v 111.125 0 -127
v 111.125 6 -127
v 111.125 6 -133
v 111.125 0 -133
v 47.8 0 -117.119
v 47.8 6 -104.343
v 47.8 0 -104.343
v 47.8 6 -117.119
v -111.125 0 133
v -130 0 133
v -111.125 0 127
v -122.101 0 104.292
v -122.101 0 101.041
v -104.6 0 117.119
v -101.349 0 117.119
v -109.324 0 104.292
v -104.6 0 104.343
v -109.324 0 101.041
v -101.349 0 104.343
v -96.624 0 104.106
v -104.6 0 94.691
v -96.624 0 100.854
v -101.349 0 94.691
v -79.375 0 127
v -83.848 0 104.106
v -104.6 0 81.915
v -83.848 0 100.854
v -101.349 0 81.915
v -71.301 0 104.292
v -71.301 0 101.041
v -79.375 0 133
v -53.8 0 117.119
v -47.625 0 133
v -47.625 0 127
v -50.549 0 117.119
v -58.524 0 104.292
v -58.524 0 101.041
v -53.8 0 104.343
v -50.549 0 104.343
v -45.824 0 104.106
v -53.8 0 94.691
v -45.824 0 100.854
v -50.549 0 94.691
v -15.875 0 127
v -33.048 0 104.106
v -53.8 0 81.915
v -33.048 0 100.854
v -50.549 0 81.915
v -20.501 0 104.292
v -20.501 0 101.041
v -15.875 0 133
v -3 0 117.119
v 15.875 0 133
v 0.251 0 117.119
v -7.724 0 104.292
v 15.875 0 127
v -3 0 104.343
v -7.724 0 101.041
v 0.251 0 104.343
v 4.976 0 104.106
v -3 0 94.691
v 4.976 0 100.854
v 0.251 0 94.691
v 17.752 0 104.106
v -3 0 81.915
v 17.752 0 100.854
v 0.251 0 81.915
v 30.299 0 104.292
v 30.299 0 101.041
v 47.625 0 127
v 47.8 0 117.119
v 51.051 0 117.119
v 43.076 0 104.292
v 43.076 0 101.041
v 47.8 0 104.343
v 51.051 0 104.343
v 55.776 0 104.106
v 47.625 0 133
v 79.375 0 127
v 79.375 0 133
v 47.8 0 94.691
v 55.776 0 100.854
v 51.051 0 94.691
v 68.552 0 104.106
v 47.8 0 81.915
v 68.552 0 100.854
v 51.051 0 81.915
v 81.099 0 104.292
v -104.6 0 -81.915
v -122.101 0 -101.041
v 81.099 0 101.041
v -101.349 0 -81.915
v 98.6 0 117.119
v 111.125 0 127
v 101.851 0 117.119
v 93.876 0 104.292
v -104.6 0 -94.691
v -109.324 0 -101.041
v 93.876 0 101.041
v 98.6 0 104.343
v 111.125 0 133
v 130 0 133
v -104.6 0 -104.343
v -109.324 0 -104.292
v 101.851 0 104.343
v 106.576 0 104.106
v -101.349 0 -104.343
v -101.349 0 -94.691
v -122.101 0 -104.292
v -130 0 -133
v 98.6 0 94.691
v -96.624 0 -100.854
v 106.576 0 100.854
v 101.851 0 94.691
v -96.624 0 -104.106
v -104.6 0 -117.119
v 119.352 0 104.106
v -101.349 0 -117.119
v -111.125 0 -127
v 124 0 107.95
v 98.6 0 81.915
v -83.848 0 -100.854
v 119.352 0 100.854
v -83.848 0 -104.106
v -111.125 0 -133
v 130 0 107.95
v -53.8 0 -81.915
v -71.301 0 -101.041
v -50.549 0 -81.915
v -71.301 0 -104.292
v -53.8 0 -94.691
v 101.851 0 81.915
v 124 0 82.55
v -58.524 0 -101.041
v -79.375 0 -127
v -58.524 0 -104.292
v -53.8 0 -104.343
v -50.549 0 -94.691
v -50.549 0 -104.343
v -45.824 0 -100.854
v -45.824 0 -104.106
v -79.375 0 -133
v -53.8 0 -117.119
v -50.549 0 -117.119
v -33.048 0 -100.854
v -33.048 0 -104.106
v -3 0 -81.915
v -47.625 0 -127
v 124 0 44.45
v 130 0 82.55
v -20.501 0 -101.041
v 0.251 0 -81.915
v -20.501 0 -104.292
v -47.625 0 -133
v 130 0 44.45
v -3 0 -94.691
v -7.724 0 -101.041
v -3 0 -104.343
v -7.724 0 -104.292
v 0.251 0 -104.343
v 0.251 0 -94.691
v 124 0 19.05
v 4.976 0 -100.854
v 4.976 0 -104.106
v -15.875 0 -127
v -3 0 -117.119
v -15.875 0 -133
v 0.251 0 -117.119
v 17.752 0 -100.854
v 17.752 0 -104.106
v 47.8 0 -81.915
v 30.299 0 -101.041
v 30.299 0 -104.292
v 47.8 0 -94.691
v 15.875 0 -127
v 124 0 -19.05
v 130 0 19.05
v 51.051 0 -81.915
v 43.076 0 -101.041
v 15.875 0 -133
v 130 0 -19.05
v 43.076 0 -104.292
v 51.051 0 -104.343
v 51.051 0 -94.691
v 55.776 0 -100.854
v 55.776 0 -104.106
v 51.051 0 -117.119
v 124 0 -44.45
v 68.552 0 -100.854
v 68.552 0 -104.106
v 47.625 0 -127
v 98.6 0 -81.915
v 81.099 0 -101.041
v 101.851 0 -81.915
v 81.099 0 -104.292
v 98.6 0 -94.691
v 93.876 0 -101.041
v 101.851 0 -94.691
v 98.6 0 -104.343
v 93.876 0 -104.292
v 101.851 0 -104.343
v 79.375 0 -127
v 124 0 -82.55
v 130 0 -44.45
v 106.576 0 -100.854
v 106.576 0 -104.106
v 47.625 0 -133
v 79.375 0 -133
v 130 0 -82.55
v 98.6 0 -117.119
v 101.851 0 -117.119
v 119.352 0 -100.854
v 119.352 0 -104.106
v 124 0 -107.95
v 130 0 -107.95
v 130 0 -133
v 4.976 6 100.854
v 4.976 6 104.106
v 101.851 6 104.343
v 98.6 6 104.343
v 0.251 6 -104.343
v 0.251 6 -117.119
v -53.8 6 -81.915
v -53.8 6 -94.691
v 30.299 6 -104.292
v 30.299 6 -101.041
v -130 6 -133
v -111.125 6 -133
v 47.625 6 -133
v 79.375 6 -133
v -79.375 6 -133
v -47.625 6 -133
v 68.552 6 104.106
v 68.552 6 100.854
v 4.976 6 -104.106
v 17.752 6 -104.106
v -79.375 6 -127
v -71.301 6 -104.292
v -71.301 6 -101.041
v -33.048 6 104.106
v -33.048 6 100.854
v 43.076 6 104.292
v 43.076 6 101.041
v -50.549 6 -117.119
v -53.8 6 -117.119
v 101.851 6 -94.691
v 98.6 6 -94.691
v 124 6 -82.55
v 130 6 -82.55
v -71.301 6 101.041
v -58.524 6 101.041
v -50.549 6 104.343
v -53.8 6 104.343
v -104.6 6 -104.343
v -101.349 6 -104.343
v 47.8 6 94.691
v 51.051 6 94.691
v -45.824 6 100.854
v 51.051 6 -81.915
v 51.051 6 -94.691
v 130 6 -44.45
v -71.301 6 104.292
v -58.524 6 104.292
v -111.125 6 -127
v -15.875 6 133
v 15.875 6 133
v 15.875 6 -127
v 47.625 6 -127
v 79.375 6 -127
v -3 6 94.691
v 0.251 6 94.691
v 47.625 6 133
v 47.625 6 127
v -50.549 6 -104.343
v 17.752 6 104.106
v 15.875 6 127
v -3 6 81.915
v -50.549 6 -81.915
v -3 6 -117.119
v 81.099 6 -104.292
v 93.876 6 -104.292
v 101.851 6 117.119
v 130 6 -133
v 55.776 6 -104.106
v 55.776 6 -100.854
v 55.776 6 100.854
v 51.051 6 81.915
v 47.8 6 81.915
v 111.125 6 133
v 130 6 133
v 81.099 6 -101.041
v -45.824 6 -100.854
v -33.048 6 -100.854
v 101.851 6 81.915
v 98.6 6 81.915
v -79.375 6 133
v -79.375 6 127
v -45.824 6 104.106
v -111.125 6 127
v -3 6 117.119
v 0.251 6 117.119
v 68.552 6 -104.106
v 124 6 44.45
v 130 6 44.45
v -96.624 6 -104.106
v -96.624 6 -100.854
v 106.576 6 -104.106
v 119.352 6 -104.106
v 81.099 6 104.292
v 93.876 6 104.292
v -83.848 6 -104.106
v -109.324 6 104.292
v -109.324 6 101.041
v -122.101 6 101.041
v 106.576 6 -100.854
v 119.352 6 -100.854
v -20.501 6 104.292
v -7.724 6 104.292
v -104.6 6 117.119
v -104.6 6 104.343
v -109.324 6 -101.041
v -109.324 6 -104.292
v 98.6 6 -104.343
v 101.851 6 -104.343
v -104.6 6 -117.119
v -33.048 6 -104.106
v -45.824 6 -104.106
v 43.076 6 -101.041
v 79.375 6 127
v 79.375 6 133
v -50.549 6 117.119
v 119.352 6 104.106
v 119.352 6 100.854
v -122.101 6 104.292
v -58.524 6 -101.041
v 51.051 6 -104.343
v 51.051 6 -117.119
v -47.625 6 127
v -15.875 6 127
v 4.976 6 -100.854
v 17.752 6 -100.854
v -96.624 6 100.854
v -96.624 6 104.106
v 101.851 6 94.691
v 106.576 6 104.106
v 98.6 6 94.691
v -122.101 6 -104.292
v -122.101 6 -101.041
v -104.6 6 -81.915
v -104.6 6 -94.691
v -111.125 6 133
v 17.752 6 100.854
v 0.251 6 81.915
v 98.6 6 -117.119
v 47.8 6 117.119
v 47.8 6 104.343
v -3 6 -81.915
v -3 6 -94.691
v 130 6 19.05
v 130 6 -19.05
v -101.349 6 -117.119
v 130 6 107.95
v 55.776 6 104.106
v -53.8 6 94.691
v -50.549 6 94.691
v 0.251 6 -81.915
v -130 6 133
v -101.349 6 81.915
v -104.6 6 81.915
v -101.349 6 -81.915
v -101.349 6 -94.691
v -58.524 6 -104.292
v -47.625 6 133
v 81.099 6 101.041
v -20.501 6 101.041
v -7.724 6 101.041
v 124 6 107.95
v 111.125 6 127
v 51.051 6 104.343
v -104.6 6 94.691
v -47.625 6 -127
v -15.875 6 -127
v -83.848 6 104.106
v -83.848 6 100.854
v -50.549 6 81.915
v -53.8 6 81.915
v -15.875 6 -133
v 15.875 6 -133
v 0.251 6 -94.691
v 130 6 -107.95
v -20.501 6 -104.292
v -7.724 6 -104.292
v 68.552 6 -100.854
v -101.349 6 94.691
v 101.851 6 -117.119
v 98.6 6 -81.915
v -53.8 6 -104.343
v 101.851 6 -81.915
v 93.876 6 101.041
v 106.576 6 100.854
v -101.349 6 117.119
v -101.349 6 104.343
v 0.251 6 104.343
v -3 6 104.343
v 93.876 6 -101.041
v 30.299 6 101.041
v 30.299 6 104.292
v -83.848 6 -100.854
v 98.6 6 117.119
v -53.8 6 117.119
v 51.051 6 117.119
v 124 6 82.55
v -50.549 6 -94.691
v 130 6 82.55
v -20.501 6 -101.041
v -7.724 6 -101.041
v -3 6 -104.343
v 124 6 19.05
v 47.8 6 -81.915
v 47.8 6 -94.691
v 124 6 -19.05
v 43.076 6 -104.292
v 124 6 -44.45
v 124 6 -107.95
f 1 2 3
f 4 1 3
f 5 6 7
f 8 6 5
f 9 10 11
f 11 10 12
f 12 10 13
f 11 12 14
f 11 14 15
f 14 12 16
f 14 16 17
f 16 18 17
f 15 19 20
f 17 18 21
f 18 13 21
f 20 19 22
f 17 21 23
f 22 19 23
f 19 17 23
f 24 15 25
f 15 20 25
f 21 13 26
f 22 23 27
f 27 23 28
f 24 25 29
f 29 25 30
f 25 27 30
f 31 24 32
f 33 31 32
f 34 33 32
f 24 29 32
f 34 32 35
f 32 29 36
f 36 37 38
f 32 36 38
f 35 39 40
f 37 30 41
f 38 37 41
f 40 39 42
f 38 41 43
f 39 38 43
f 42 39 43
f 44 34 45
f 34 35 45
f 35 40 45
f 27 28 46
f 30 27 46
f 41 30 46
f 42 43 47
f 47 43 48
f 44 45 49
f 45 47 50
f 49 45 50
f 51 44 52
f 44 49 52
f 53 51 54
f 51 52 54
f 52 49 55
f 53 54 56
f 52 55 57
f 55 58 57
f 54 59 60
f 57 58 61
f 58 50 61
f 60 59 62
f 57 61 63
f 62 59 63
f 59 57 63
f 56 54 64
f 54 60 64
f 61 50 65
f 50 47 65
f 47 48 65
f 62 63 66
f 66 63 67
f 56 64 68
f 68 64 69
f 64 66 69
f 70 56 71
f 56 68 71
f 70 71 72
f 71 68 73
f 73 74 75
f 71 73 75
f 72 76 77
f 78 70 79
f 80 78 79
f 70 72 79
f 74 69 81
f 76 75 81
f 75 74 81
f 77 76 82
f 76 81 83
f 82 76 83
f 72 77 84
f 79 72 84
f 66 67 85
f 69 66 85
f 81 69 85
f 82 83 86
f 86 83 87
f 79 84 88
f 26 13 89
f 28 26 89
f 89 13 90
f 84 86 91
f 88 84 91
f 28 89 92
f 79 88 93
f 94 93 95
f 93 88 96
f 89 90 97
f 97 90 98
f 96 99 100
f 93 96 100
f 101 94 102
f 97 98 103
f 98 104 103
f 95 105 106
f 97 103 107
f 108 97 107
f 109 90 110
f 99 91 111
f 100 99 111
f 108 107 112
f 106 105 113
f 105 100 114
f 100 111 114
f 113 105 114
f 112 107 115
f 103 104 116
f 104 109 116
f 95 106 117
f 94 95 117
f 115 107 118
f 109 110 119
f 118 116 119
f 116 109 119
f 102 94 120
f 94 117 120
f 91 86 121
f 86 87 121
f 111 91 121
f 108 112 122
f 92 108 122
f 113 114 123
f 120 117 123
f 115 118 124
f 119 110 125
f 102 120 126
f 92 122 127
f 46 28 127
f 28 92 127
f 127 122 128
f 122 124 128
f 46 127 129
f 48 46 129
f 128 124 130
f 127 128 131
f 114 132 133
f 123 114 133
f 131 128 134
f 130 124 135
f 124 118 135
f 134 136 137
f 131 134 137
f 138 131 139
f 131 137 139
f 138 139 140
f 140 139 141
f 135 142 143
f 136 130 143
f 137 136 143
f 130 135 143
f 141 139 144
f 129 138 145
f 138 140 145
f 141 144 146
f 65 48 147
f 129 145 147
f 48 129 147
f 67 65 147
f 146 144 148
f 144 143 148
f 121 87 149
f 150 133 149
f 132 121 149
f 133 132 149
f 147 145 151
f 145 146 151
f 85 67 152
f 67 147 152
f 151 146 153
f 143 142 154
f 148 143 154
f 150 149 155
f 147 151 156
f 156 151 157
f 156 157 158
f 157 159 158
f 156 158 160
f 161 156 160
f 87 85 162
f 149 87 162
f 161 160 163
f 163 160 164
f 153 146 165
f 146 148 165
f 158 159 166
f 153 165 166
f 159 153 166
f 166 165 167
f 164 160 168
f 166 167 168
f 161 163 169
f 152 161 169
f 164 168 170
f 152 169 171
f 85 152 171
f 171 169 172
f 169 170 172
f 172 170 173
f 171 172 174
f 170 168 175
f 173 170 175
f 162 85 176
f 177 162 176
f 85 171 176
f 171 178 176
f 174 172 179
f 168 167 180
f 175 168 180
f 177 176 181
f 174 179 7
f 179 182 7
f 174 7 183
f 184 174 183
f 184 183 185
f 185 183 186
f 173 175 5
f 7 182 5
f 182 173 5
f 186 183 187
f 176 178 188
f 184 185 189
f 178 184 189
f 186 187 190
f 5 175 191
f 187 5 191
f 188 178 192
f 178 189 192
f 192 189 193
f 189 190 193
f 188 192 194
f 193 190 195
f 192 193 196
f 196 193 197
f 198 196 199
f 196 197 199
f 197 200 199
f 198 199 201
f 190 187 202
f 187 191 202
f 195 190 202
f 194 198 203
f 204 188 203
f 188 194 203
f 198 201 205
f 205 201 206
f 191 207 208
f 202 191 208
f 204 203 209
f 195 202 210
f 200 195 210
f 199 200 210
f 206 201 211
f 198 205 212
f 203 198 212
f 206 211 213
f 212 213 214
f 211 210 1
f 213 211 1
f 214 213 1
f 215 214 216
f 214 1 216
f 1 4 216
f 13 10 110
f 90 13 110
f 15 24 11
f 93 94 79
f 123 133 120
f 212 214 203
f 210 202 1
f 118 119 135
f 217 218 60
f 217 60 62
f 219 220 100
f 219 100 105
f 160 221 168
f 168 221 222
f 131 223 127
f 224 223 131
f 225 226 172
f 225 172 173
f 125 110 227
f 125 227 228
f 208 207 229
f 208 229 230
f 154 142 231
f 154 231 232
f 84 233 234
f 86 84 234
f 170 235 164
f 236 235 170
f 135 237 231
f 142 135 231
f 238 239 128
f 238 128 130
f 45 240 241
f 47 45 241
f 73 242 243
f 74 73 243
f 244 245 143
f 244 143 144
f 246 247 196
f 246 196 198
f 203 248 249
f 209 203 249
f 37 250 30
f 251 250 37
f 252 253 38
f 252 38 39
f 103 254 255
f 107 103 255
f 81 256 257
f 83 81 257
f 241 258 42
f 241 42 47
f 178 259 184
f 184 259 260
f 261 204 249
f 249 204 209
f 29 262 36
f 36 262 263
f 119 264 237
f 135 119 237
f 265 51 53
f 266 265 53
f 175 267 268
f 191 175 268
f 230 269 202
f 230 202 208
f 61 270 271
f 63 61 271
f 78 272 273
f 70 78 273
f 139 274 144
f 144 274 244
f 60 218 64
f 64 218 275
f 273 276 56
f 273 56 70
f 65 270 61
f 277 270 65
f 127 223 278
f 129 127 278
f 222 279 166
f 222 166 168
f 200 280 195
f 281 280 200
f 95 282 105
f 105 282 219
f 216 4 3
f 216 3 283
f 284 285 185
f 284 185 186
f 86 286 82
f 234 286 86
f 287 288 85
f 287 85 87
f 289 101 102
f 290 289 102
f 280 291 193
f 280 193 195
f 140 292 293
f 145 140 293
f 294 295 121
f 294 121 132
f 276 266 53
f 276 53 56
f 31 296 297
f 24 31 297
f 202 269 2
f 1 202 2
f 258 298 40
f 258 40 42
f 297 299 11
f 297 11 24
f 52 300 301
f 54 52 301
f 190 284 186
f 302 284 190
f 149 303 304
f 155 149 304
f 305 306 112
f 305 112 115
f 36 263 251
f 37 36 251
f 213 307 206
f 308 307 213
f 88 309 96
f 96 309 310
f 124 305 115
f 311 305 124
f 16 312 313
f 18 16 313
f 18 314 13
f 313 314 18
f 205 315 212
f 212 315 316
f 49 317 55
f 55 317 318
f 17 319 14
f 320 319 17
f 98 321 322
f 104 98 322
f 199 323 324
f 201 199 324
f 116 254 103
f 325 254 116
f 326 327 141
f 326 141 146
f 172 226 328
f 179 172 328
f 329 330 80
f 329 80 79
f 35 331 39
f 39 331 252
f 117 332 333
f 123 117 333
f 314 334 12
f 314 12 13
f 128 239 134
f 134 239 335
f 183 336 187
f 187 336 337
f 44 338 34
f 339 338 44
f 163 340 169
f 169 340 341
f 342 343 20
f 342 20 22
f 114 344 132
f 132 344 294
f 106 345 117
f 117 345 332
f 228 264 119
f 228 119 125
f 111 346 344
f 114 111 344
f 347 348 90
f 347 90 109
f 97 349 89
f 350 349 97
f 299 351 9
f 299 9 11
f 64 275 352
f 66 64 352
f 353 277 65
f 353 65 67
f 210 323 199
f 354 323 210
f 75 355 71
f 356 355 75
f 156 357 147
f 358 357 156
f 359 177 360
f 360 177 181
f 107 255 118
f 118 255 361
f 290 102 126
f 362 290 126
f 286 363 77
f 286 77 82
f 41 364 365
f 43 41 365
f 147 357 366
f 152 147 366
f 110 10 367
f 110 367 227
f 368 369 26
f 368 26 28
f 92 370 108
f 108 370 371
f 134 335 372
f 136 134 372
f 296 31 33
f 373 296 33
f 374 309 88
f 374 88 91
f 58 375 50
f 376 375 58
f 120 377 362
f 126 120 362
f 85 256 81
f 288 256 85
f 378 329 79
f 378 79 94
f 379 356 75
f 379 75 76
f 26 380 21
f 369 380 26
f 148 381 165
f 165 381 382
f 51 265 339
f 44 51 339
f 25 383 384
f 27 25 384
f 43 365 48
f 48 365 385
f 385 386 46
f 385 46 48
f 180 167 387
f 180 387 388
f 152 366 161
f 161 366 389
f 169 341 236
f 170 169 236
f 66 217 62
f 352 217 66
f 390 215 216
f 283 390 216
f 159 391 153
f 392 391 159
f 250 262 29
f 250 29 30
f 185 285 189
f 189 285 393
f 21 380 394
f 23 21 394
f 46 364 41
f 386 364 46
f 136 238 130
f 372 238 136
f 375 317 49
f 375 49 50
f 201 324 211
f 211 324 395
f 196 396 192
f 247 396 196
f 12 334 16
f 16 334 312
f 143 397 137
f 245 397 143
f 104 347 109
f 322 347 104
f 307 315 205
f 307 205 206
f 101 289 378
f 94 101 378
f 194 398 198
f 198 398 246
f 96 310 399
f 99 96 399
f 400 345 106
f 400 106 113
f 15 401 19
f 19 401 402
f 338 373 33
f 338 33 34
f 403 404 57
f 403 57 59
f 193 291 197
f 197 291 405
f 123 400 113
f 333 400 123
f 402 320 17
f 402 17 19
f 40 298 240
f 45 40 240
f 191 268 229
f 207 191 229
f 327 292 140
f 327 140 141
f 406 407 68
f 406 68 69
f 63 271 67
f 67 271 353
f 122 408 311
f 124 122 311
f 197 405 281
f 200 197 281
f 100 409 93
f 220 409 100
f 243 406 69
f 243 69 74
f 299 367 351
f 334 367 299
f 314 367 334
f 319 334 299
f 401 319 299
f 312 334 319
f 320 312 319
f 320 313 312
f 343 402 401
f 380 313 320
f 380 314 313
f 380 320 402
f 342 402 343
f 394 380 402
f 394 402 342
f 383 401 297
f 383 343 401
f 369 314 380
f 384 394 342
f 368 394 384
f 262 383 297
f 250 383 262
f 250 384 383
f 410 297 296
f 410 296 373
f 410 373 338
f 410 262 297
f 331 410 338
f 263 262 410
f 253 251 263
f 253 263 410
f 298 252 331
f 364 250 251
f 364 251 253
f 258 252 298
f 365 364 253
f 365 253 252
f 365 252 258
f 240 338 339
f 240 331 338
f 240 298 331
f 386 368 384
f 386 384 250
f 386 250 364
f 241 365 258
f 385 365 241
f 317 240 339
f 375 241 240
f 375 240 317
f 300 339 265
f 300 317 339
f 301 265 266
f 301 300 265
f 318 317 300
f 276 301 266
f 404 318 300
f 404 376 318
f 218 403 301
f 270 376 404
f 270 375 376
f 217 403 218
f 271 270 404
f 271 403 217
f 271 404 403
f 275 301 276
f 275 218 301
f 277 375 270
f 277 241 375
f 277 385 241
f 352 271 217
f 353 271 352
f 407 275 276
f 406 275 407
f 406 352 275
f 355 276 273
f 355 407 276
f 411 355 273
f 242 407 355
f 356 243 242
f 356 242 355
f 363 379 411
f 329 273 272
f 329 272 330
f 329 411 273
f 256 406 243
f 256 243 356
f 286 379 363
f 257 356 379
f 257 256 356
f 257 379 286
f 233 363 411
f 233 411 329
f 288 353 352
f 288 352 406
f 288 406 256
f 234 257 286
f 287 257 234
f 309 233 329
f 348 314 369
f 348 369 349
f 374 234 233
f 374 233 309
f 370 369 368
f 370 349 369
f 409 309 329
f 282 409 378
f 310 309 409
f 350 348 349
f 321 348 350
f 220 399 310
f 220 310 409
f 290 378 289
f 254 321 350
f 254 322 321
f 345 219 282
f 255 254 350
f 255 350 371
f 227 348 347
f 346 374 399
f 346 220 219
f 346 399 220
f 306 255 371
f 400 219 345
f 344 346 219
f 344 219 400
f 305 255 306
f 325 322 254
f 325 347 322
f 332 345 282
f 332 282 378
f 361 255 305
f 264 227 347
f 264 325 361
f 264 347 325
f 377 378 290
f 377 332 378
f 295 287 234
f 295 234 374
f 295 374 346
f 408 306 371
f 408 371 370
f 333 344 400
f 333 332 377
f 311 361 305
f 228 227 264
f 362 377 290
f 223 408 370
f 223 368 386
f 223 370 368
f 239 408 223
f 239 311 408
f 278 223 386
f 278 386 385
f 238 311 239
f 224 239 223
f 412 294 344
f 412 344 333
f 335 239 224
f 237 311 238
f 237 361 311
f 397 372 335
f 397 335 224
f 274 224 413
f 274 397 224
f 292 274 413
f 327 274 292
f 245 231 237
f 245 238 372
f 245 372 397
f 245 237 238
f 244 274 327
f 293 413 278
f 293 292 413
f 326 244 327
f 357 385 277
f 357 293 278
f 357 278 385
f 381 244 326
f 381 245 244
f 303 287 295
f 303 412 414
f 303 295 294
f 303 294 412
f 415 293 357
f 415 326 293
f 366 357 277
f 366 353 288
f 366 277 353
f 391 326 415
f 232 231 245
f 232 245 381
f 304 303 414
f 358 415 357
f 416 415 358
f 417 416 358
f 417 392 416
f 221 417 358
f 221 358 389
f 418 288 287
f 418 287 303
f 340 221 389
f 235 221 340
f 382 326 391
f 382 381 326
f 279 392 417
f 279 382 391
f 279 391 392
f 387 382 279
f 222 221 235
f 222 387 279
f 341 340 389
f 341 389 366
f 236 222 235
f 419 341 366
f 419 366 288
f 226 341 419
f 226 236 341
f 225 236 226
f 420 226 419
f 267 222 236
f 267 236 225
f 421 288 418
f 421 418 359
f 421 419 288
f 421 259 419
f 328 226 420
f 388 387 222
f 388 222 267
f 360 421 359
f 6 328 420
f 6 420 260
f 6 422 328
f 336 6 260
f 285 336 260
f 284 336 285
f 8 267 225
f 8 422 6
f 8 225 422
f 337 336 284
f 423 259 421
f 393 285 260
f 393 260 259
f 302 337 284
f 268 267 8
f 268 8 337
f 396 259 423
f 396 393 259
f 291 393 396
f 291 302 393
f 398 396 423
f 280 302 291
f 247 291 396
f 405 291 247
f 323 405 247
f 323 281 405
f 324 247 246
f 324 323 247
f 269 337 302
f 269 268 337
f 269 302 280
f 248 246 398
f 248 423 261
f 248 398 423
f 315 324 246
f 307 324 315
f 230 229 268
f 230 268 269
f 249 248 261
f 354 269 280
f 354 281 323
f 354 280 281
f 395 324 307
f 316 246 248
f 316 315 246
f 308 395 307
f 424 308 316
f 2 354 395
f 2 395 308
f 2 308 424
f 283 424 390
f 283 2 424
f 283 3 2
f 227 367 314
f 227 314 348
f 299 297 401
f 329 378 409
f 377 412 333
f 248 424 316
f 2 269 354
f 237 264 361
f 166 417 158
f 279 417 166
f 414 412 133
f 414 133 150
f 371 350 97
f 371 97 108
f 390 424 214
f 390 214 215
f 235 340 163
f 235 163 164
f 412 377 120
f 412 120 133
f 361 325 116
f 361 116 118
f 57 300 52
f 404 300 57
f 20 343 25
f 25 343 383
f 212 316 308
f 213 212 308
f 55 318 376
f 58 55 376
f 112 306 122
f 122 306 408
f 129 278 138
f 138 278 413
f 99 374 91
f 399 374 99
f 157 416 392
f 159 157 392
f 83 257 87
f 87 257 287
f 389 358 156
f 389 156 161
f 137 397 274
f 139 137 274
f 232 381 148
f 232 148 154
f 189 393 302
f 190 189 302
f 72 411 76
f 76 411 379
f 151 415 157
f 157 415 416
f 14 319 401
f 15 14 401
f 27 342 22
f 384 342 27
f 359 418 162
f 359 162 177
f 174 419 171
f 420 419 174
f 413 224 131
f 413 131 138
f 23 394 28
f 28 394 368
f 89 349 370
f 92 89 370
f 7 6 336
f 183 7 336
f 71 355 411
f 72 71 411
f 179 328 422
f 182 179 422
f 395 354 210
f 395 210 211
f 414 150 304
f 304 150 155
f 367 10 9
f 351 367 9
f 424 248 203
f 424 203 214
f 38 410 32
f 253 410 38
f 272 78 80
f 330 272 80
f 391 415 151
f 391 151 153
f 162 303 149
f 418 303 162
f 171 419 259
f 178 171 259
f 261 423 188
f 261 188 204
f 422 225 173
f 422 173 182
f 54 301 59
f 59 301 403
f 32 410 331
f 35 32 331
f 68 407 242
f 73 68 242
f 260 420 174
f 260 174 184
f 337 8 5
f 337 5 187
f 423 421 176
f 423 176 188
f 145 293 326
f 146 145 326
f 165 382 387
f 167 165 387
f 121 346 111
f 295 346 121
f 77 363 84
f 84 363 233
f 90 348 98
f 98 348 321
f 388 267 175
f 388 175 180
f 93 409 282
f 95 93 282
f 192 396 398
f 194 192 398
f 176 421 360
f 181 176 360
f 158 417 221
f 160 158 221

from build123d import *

# Parameters (mm, degrees)
SKETCH1_W           = 260
SKETCH1_H           = 266
BOSS_EXTRUDE1_DEPTH = 6
SKETCH2_W           = 31.75
SKETCH2_H           = 6
SKETCH2_W_2         = 6
SKETCH2_H_2         = 25.4
TAB_CUT_OUTS_DEPTH  = 6
SKETCH4_W           = 12.7762
SKETCH4_H           = 3.2512
SKETCH4_W_2         = 3.2512
SKETCH4_H_2         = 12.7762
CUT_EXTRUDE1_DEPTH  = 7


with BuildPart() as part:
    # Sketch1 → Boss-Extrude1 (new body)
    with BuildSketch(Plane(origin=(0, 0, 0), x_dir=(1, 0, 0), z_dir=(0, 1, 0))):
        Rectangle(SKETCH1_W, SKETCH1_H)
    extrude(amount=BOSS_EXTRUDE1_DEPTH)

    # Sketch2 → Tab Cut Outs (cut)
    with BuildSketch(Plane(origin=(0, 6, 0), x_dir=(1, 0, 0), z_dir=(0, 1, 0))):
        with Locations((95.25, 130)):
            Rectangle(SKETCH2_W, SKETCH2_H)
        with Locations((-31.75, 130)):
            Rectangle(SKETCH2_W, SKETCH2_H)
        with Locations((-95.25, 130)):
            Rectangle(SKETCH2_W, SKETCH2_H)
        with Locations((31.75, 130)):
            Rectangle(SKETCH2_W, SKETCH2_H)
        with Locations((31.75, -130)):
            Rectangle(SKETCH2_W, SKETCH2_H)
        with Locations((95.25, -130)):
            Rectangle(SKETCH2_W, SKETCH2_H)
        with Locations((-95.25, -130)):
            Rectangle(SKETCH2_W, SKETCH2_H)
        with Locations((-31.75, -130)):
            Rectangle(SKETCH2_W, SKETCH2_H)
        with Locations((127, -95.25)):
            Rectangle(SKETCH2_W_2, SKETCH2_H_2)
        with Locations((127, 31.75)):
            Rectangle(SKETCH2_W_2, SKETCH2_H_2)
        with Locations((127, 95.25)):
            Rectangle(SKETCH2_W_2, SKETCH2_H_2)
        with Locations((127, -31.75)):
            Rectangle(SKETCH2_W_2, SKETCH2_H_2)
    extrude(amount=-TAB_CUT_OUTS_DEPTH, mode=Mode.SUBTRACT)

    # Sketch4 → Cut-Extrude1 (cut, through all)
    with BuildSketch(Plane(origin=(0, 6, 0), x_dir=(1, 0, 0), z_dir=(0, 1, 0))):
        with Locations((-64.9125, 102.6668)):
            Rectangle(SKETCH4_W, SKETCH4_H)
        with Locations((-102.9744, 88.3031)):
            Rectangle(SKETCH4_W_2, SKETCH4_H_2)
        with Locations((-102.9744, 110.7313)):
            Rectangle(SKETCH4_W_2, SKETCH4_H_2)
        with Locations((-52.1744, 110.7313)):
            Rectangle(SKETCH4_W_2, SKETCH4_H_2)
        with Locations((-115.7125, 102.6668)):
            Rectangle(SKETCH4_W, SKETCH4_H)
        with Locations((-90.2363, 102.479993419)):
            Rectangle(SKETCH4_W, SKETCH4_H)
        with Locations((-39.4363, 102.479993419)):
            Rectangle(SKETCH4_W, SKETCH4_H)
        with Locations((-52.1744, 88.3031)):
            Rectangle(SKETCH4_W_2, SKETCH4_H_2)
        with Locations((-14.1125, 102.6668)):
            Rectangle(SKETCH4_W, SKETCH4_H)
        with Locations((-1.3744, 110.7313)):
            Rectangle(SKETCH4_W_2, SKETCH4_H_2)
        with Locations((11.3637, 102.479993419)):
            Rectangle(SKETCH4_W, SKETCH4_H)
        with Locations((-1.3744, 88.3031)):
            Rectangle(SKETCH4_W_2, SKETCH4_H_2)
        with Locations((36.6875, 102.6668)):
            Rectangle(SKETCH4_W, SKETCH4_H)
        with Locations((49.4256, 110.7313)):
            Rectangle(SKETCH4_W_2, SKETCH4_H_2)
        with Locations((62.1637, 102.479993419)):
            Rectangle(SKETCH4_W, SKETCH4_H)
        with Locations((49.4256, 88.3031)):
            Rectangle(SKETCH4_W_2, SKETCH4_H_2)
        with Locations((87.4875, 102.6668)):
            Rectangle(SKETCH4_W, SKETCH4_H)
        with Locations((100.2256, 110.7313)):
            Rectangle(SKETCH4_W_2, SKETCH4_H_2)
        with Locations((112.9637, 102.479993419)):
            Rectangle(SKETCH4_W, SKETCH4_H)
        with Locations((100.2256, 88.3031)):
            Rectangle(SKETCH4_W_2, SKETCH4_H_2)
        with Locations((-52.1744, -88.3031)):
            Rectangle(SKETCH4_W_2, SKETCH4_H_2)
        with Locations((-39.4363, -102.479993419)):
            Rectangle(SKETCH4_W, SKETCH4_H)
        with Locations((-52.1744, -110.7313)):
            Rectangle(SKETCH4_W_2, SKETCH4_H_2)
        with Locations((-64.9125, -102.6668)):
            Rectangle(SKETCH4_W, SKETCH4_H)
        with Locations((-1.3744, -88.3031)):
            Rectangle(SKETCH4_W_2, SKETCH4_H_2)
        with Locations((11.3637, -102.479993419)):
            Rectangle(SKETCH4_W, SKETCH4_H)
        with Locations((-1.3744, -110.7313)):
            Rectangle(SKETCH4_W_2, SKETCH4_H_2)
        with Locations((-14.1125, -102.6668)):
            Rectangle(SKETCH4_W, SKETCH4_H)
        with Locations((49.4256, -88.3031)):
            Rectangle(SKETCH4_W_2, SKETCH4_H_2)
        with Locations((62.1637, -102.479993419)):
            Rectangle(SKETCH4_W, SKETCH4_H)
        with Locations((49.4256, -110.7313)):
            Rectangle(SKETCH4_W_2, SKETCH4_H_2)
        with Locations((36.6875, -102.6668)):
            Rectangle(SKETCH4_W, SKETCH4_H)
        with Locations((112.9637, -102.479993419)):
            Rectangle(SKETCH4_W, SKETCH4_H)
        with Locations((100.2256, -88.3031)):
            Rectangle(SKETCH4_W_2, SKETCH4_H_2)
        with Locations((100.2256, -110.7313)):
            Rectangle(SKETCH4_W_2, SKETCH4_H_2)
        with Locations((87.4875, -102.6668)):
            Rectangle(SKETCH4_W, SKETCH4_H)
        with Locations((-102.9744, -88.3031)):
            Rectangle(SKETCH4_W_2, SKETCH4_H_2)
        with Locations((-90.2363, -102.479993419)):
            Rectangle(SKETCH4_W, SKETCH4_H)
        with Locations((-102.9744, -110.7313)):
            Rectangle(SKETCH4_W_2, SKETCH4_H_2)
        with Locations((-115.7125, -102.6668)):
            Rectangle(SKETCH4_W, SKETCH4_H)
    extrude(amount=-CUT_EXTRUDE1_DEPTH, mode=Mode.SUBTRACT)


solid = part.part
